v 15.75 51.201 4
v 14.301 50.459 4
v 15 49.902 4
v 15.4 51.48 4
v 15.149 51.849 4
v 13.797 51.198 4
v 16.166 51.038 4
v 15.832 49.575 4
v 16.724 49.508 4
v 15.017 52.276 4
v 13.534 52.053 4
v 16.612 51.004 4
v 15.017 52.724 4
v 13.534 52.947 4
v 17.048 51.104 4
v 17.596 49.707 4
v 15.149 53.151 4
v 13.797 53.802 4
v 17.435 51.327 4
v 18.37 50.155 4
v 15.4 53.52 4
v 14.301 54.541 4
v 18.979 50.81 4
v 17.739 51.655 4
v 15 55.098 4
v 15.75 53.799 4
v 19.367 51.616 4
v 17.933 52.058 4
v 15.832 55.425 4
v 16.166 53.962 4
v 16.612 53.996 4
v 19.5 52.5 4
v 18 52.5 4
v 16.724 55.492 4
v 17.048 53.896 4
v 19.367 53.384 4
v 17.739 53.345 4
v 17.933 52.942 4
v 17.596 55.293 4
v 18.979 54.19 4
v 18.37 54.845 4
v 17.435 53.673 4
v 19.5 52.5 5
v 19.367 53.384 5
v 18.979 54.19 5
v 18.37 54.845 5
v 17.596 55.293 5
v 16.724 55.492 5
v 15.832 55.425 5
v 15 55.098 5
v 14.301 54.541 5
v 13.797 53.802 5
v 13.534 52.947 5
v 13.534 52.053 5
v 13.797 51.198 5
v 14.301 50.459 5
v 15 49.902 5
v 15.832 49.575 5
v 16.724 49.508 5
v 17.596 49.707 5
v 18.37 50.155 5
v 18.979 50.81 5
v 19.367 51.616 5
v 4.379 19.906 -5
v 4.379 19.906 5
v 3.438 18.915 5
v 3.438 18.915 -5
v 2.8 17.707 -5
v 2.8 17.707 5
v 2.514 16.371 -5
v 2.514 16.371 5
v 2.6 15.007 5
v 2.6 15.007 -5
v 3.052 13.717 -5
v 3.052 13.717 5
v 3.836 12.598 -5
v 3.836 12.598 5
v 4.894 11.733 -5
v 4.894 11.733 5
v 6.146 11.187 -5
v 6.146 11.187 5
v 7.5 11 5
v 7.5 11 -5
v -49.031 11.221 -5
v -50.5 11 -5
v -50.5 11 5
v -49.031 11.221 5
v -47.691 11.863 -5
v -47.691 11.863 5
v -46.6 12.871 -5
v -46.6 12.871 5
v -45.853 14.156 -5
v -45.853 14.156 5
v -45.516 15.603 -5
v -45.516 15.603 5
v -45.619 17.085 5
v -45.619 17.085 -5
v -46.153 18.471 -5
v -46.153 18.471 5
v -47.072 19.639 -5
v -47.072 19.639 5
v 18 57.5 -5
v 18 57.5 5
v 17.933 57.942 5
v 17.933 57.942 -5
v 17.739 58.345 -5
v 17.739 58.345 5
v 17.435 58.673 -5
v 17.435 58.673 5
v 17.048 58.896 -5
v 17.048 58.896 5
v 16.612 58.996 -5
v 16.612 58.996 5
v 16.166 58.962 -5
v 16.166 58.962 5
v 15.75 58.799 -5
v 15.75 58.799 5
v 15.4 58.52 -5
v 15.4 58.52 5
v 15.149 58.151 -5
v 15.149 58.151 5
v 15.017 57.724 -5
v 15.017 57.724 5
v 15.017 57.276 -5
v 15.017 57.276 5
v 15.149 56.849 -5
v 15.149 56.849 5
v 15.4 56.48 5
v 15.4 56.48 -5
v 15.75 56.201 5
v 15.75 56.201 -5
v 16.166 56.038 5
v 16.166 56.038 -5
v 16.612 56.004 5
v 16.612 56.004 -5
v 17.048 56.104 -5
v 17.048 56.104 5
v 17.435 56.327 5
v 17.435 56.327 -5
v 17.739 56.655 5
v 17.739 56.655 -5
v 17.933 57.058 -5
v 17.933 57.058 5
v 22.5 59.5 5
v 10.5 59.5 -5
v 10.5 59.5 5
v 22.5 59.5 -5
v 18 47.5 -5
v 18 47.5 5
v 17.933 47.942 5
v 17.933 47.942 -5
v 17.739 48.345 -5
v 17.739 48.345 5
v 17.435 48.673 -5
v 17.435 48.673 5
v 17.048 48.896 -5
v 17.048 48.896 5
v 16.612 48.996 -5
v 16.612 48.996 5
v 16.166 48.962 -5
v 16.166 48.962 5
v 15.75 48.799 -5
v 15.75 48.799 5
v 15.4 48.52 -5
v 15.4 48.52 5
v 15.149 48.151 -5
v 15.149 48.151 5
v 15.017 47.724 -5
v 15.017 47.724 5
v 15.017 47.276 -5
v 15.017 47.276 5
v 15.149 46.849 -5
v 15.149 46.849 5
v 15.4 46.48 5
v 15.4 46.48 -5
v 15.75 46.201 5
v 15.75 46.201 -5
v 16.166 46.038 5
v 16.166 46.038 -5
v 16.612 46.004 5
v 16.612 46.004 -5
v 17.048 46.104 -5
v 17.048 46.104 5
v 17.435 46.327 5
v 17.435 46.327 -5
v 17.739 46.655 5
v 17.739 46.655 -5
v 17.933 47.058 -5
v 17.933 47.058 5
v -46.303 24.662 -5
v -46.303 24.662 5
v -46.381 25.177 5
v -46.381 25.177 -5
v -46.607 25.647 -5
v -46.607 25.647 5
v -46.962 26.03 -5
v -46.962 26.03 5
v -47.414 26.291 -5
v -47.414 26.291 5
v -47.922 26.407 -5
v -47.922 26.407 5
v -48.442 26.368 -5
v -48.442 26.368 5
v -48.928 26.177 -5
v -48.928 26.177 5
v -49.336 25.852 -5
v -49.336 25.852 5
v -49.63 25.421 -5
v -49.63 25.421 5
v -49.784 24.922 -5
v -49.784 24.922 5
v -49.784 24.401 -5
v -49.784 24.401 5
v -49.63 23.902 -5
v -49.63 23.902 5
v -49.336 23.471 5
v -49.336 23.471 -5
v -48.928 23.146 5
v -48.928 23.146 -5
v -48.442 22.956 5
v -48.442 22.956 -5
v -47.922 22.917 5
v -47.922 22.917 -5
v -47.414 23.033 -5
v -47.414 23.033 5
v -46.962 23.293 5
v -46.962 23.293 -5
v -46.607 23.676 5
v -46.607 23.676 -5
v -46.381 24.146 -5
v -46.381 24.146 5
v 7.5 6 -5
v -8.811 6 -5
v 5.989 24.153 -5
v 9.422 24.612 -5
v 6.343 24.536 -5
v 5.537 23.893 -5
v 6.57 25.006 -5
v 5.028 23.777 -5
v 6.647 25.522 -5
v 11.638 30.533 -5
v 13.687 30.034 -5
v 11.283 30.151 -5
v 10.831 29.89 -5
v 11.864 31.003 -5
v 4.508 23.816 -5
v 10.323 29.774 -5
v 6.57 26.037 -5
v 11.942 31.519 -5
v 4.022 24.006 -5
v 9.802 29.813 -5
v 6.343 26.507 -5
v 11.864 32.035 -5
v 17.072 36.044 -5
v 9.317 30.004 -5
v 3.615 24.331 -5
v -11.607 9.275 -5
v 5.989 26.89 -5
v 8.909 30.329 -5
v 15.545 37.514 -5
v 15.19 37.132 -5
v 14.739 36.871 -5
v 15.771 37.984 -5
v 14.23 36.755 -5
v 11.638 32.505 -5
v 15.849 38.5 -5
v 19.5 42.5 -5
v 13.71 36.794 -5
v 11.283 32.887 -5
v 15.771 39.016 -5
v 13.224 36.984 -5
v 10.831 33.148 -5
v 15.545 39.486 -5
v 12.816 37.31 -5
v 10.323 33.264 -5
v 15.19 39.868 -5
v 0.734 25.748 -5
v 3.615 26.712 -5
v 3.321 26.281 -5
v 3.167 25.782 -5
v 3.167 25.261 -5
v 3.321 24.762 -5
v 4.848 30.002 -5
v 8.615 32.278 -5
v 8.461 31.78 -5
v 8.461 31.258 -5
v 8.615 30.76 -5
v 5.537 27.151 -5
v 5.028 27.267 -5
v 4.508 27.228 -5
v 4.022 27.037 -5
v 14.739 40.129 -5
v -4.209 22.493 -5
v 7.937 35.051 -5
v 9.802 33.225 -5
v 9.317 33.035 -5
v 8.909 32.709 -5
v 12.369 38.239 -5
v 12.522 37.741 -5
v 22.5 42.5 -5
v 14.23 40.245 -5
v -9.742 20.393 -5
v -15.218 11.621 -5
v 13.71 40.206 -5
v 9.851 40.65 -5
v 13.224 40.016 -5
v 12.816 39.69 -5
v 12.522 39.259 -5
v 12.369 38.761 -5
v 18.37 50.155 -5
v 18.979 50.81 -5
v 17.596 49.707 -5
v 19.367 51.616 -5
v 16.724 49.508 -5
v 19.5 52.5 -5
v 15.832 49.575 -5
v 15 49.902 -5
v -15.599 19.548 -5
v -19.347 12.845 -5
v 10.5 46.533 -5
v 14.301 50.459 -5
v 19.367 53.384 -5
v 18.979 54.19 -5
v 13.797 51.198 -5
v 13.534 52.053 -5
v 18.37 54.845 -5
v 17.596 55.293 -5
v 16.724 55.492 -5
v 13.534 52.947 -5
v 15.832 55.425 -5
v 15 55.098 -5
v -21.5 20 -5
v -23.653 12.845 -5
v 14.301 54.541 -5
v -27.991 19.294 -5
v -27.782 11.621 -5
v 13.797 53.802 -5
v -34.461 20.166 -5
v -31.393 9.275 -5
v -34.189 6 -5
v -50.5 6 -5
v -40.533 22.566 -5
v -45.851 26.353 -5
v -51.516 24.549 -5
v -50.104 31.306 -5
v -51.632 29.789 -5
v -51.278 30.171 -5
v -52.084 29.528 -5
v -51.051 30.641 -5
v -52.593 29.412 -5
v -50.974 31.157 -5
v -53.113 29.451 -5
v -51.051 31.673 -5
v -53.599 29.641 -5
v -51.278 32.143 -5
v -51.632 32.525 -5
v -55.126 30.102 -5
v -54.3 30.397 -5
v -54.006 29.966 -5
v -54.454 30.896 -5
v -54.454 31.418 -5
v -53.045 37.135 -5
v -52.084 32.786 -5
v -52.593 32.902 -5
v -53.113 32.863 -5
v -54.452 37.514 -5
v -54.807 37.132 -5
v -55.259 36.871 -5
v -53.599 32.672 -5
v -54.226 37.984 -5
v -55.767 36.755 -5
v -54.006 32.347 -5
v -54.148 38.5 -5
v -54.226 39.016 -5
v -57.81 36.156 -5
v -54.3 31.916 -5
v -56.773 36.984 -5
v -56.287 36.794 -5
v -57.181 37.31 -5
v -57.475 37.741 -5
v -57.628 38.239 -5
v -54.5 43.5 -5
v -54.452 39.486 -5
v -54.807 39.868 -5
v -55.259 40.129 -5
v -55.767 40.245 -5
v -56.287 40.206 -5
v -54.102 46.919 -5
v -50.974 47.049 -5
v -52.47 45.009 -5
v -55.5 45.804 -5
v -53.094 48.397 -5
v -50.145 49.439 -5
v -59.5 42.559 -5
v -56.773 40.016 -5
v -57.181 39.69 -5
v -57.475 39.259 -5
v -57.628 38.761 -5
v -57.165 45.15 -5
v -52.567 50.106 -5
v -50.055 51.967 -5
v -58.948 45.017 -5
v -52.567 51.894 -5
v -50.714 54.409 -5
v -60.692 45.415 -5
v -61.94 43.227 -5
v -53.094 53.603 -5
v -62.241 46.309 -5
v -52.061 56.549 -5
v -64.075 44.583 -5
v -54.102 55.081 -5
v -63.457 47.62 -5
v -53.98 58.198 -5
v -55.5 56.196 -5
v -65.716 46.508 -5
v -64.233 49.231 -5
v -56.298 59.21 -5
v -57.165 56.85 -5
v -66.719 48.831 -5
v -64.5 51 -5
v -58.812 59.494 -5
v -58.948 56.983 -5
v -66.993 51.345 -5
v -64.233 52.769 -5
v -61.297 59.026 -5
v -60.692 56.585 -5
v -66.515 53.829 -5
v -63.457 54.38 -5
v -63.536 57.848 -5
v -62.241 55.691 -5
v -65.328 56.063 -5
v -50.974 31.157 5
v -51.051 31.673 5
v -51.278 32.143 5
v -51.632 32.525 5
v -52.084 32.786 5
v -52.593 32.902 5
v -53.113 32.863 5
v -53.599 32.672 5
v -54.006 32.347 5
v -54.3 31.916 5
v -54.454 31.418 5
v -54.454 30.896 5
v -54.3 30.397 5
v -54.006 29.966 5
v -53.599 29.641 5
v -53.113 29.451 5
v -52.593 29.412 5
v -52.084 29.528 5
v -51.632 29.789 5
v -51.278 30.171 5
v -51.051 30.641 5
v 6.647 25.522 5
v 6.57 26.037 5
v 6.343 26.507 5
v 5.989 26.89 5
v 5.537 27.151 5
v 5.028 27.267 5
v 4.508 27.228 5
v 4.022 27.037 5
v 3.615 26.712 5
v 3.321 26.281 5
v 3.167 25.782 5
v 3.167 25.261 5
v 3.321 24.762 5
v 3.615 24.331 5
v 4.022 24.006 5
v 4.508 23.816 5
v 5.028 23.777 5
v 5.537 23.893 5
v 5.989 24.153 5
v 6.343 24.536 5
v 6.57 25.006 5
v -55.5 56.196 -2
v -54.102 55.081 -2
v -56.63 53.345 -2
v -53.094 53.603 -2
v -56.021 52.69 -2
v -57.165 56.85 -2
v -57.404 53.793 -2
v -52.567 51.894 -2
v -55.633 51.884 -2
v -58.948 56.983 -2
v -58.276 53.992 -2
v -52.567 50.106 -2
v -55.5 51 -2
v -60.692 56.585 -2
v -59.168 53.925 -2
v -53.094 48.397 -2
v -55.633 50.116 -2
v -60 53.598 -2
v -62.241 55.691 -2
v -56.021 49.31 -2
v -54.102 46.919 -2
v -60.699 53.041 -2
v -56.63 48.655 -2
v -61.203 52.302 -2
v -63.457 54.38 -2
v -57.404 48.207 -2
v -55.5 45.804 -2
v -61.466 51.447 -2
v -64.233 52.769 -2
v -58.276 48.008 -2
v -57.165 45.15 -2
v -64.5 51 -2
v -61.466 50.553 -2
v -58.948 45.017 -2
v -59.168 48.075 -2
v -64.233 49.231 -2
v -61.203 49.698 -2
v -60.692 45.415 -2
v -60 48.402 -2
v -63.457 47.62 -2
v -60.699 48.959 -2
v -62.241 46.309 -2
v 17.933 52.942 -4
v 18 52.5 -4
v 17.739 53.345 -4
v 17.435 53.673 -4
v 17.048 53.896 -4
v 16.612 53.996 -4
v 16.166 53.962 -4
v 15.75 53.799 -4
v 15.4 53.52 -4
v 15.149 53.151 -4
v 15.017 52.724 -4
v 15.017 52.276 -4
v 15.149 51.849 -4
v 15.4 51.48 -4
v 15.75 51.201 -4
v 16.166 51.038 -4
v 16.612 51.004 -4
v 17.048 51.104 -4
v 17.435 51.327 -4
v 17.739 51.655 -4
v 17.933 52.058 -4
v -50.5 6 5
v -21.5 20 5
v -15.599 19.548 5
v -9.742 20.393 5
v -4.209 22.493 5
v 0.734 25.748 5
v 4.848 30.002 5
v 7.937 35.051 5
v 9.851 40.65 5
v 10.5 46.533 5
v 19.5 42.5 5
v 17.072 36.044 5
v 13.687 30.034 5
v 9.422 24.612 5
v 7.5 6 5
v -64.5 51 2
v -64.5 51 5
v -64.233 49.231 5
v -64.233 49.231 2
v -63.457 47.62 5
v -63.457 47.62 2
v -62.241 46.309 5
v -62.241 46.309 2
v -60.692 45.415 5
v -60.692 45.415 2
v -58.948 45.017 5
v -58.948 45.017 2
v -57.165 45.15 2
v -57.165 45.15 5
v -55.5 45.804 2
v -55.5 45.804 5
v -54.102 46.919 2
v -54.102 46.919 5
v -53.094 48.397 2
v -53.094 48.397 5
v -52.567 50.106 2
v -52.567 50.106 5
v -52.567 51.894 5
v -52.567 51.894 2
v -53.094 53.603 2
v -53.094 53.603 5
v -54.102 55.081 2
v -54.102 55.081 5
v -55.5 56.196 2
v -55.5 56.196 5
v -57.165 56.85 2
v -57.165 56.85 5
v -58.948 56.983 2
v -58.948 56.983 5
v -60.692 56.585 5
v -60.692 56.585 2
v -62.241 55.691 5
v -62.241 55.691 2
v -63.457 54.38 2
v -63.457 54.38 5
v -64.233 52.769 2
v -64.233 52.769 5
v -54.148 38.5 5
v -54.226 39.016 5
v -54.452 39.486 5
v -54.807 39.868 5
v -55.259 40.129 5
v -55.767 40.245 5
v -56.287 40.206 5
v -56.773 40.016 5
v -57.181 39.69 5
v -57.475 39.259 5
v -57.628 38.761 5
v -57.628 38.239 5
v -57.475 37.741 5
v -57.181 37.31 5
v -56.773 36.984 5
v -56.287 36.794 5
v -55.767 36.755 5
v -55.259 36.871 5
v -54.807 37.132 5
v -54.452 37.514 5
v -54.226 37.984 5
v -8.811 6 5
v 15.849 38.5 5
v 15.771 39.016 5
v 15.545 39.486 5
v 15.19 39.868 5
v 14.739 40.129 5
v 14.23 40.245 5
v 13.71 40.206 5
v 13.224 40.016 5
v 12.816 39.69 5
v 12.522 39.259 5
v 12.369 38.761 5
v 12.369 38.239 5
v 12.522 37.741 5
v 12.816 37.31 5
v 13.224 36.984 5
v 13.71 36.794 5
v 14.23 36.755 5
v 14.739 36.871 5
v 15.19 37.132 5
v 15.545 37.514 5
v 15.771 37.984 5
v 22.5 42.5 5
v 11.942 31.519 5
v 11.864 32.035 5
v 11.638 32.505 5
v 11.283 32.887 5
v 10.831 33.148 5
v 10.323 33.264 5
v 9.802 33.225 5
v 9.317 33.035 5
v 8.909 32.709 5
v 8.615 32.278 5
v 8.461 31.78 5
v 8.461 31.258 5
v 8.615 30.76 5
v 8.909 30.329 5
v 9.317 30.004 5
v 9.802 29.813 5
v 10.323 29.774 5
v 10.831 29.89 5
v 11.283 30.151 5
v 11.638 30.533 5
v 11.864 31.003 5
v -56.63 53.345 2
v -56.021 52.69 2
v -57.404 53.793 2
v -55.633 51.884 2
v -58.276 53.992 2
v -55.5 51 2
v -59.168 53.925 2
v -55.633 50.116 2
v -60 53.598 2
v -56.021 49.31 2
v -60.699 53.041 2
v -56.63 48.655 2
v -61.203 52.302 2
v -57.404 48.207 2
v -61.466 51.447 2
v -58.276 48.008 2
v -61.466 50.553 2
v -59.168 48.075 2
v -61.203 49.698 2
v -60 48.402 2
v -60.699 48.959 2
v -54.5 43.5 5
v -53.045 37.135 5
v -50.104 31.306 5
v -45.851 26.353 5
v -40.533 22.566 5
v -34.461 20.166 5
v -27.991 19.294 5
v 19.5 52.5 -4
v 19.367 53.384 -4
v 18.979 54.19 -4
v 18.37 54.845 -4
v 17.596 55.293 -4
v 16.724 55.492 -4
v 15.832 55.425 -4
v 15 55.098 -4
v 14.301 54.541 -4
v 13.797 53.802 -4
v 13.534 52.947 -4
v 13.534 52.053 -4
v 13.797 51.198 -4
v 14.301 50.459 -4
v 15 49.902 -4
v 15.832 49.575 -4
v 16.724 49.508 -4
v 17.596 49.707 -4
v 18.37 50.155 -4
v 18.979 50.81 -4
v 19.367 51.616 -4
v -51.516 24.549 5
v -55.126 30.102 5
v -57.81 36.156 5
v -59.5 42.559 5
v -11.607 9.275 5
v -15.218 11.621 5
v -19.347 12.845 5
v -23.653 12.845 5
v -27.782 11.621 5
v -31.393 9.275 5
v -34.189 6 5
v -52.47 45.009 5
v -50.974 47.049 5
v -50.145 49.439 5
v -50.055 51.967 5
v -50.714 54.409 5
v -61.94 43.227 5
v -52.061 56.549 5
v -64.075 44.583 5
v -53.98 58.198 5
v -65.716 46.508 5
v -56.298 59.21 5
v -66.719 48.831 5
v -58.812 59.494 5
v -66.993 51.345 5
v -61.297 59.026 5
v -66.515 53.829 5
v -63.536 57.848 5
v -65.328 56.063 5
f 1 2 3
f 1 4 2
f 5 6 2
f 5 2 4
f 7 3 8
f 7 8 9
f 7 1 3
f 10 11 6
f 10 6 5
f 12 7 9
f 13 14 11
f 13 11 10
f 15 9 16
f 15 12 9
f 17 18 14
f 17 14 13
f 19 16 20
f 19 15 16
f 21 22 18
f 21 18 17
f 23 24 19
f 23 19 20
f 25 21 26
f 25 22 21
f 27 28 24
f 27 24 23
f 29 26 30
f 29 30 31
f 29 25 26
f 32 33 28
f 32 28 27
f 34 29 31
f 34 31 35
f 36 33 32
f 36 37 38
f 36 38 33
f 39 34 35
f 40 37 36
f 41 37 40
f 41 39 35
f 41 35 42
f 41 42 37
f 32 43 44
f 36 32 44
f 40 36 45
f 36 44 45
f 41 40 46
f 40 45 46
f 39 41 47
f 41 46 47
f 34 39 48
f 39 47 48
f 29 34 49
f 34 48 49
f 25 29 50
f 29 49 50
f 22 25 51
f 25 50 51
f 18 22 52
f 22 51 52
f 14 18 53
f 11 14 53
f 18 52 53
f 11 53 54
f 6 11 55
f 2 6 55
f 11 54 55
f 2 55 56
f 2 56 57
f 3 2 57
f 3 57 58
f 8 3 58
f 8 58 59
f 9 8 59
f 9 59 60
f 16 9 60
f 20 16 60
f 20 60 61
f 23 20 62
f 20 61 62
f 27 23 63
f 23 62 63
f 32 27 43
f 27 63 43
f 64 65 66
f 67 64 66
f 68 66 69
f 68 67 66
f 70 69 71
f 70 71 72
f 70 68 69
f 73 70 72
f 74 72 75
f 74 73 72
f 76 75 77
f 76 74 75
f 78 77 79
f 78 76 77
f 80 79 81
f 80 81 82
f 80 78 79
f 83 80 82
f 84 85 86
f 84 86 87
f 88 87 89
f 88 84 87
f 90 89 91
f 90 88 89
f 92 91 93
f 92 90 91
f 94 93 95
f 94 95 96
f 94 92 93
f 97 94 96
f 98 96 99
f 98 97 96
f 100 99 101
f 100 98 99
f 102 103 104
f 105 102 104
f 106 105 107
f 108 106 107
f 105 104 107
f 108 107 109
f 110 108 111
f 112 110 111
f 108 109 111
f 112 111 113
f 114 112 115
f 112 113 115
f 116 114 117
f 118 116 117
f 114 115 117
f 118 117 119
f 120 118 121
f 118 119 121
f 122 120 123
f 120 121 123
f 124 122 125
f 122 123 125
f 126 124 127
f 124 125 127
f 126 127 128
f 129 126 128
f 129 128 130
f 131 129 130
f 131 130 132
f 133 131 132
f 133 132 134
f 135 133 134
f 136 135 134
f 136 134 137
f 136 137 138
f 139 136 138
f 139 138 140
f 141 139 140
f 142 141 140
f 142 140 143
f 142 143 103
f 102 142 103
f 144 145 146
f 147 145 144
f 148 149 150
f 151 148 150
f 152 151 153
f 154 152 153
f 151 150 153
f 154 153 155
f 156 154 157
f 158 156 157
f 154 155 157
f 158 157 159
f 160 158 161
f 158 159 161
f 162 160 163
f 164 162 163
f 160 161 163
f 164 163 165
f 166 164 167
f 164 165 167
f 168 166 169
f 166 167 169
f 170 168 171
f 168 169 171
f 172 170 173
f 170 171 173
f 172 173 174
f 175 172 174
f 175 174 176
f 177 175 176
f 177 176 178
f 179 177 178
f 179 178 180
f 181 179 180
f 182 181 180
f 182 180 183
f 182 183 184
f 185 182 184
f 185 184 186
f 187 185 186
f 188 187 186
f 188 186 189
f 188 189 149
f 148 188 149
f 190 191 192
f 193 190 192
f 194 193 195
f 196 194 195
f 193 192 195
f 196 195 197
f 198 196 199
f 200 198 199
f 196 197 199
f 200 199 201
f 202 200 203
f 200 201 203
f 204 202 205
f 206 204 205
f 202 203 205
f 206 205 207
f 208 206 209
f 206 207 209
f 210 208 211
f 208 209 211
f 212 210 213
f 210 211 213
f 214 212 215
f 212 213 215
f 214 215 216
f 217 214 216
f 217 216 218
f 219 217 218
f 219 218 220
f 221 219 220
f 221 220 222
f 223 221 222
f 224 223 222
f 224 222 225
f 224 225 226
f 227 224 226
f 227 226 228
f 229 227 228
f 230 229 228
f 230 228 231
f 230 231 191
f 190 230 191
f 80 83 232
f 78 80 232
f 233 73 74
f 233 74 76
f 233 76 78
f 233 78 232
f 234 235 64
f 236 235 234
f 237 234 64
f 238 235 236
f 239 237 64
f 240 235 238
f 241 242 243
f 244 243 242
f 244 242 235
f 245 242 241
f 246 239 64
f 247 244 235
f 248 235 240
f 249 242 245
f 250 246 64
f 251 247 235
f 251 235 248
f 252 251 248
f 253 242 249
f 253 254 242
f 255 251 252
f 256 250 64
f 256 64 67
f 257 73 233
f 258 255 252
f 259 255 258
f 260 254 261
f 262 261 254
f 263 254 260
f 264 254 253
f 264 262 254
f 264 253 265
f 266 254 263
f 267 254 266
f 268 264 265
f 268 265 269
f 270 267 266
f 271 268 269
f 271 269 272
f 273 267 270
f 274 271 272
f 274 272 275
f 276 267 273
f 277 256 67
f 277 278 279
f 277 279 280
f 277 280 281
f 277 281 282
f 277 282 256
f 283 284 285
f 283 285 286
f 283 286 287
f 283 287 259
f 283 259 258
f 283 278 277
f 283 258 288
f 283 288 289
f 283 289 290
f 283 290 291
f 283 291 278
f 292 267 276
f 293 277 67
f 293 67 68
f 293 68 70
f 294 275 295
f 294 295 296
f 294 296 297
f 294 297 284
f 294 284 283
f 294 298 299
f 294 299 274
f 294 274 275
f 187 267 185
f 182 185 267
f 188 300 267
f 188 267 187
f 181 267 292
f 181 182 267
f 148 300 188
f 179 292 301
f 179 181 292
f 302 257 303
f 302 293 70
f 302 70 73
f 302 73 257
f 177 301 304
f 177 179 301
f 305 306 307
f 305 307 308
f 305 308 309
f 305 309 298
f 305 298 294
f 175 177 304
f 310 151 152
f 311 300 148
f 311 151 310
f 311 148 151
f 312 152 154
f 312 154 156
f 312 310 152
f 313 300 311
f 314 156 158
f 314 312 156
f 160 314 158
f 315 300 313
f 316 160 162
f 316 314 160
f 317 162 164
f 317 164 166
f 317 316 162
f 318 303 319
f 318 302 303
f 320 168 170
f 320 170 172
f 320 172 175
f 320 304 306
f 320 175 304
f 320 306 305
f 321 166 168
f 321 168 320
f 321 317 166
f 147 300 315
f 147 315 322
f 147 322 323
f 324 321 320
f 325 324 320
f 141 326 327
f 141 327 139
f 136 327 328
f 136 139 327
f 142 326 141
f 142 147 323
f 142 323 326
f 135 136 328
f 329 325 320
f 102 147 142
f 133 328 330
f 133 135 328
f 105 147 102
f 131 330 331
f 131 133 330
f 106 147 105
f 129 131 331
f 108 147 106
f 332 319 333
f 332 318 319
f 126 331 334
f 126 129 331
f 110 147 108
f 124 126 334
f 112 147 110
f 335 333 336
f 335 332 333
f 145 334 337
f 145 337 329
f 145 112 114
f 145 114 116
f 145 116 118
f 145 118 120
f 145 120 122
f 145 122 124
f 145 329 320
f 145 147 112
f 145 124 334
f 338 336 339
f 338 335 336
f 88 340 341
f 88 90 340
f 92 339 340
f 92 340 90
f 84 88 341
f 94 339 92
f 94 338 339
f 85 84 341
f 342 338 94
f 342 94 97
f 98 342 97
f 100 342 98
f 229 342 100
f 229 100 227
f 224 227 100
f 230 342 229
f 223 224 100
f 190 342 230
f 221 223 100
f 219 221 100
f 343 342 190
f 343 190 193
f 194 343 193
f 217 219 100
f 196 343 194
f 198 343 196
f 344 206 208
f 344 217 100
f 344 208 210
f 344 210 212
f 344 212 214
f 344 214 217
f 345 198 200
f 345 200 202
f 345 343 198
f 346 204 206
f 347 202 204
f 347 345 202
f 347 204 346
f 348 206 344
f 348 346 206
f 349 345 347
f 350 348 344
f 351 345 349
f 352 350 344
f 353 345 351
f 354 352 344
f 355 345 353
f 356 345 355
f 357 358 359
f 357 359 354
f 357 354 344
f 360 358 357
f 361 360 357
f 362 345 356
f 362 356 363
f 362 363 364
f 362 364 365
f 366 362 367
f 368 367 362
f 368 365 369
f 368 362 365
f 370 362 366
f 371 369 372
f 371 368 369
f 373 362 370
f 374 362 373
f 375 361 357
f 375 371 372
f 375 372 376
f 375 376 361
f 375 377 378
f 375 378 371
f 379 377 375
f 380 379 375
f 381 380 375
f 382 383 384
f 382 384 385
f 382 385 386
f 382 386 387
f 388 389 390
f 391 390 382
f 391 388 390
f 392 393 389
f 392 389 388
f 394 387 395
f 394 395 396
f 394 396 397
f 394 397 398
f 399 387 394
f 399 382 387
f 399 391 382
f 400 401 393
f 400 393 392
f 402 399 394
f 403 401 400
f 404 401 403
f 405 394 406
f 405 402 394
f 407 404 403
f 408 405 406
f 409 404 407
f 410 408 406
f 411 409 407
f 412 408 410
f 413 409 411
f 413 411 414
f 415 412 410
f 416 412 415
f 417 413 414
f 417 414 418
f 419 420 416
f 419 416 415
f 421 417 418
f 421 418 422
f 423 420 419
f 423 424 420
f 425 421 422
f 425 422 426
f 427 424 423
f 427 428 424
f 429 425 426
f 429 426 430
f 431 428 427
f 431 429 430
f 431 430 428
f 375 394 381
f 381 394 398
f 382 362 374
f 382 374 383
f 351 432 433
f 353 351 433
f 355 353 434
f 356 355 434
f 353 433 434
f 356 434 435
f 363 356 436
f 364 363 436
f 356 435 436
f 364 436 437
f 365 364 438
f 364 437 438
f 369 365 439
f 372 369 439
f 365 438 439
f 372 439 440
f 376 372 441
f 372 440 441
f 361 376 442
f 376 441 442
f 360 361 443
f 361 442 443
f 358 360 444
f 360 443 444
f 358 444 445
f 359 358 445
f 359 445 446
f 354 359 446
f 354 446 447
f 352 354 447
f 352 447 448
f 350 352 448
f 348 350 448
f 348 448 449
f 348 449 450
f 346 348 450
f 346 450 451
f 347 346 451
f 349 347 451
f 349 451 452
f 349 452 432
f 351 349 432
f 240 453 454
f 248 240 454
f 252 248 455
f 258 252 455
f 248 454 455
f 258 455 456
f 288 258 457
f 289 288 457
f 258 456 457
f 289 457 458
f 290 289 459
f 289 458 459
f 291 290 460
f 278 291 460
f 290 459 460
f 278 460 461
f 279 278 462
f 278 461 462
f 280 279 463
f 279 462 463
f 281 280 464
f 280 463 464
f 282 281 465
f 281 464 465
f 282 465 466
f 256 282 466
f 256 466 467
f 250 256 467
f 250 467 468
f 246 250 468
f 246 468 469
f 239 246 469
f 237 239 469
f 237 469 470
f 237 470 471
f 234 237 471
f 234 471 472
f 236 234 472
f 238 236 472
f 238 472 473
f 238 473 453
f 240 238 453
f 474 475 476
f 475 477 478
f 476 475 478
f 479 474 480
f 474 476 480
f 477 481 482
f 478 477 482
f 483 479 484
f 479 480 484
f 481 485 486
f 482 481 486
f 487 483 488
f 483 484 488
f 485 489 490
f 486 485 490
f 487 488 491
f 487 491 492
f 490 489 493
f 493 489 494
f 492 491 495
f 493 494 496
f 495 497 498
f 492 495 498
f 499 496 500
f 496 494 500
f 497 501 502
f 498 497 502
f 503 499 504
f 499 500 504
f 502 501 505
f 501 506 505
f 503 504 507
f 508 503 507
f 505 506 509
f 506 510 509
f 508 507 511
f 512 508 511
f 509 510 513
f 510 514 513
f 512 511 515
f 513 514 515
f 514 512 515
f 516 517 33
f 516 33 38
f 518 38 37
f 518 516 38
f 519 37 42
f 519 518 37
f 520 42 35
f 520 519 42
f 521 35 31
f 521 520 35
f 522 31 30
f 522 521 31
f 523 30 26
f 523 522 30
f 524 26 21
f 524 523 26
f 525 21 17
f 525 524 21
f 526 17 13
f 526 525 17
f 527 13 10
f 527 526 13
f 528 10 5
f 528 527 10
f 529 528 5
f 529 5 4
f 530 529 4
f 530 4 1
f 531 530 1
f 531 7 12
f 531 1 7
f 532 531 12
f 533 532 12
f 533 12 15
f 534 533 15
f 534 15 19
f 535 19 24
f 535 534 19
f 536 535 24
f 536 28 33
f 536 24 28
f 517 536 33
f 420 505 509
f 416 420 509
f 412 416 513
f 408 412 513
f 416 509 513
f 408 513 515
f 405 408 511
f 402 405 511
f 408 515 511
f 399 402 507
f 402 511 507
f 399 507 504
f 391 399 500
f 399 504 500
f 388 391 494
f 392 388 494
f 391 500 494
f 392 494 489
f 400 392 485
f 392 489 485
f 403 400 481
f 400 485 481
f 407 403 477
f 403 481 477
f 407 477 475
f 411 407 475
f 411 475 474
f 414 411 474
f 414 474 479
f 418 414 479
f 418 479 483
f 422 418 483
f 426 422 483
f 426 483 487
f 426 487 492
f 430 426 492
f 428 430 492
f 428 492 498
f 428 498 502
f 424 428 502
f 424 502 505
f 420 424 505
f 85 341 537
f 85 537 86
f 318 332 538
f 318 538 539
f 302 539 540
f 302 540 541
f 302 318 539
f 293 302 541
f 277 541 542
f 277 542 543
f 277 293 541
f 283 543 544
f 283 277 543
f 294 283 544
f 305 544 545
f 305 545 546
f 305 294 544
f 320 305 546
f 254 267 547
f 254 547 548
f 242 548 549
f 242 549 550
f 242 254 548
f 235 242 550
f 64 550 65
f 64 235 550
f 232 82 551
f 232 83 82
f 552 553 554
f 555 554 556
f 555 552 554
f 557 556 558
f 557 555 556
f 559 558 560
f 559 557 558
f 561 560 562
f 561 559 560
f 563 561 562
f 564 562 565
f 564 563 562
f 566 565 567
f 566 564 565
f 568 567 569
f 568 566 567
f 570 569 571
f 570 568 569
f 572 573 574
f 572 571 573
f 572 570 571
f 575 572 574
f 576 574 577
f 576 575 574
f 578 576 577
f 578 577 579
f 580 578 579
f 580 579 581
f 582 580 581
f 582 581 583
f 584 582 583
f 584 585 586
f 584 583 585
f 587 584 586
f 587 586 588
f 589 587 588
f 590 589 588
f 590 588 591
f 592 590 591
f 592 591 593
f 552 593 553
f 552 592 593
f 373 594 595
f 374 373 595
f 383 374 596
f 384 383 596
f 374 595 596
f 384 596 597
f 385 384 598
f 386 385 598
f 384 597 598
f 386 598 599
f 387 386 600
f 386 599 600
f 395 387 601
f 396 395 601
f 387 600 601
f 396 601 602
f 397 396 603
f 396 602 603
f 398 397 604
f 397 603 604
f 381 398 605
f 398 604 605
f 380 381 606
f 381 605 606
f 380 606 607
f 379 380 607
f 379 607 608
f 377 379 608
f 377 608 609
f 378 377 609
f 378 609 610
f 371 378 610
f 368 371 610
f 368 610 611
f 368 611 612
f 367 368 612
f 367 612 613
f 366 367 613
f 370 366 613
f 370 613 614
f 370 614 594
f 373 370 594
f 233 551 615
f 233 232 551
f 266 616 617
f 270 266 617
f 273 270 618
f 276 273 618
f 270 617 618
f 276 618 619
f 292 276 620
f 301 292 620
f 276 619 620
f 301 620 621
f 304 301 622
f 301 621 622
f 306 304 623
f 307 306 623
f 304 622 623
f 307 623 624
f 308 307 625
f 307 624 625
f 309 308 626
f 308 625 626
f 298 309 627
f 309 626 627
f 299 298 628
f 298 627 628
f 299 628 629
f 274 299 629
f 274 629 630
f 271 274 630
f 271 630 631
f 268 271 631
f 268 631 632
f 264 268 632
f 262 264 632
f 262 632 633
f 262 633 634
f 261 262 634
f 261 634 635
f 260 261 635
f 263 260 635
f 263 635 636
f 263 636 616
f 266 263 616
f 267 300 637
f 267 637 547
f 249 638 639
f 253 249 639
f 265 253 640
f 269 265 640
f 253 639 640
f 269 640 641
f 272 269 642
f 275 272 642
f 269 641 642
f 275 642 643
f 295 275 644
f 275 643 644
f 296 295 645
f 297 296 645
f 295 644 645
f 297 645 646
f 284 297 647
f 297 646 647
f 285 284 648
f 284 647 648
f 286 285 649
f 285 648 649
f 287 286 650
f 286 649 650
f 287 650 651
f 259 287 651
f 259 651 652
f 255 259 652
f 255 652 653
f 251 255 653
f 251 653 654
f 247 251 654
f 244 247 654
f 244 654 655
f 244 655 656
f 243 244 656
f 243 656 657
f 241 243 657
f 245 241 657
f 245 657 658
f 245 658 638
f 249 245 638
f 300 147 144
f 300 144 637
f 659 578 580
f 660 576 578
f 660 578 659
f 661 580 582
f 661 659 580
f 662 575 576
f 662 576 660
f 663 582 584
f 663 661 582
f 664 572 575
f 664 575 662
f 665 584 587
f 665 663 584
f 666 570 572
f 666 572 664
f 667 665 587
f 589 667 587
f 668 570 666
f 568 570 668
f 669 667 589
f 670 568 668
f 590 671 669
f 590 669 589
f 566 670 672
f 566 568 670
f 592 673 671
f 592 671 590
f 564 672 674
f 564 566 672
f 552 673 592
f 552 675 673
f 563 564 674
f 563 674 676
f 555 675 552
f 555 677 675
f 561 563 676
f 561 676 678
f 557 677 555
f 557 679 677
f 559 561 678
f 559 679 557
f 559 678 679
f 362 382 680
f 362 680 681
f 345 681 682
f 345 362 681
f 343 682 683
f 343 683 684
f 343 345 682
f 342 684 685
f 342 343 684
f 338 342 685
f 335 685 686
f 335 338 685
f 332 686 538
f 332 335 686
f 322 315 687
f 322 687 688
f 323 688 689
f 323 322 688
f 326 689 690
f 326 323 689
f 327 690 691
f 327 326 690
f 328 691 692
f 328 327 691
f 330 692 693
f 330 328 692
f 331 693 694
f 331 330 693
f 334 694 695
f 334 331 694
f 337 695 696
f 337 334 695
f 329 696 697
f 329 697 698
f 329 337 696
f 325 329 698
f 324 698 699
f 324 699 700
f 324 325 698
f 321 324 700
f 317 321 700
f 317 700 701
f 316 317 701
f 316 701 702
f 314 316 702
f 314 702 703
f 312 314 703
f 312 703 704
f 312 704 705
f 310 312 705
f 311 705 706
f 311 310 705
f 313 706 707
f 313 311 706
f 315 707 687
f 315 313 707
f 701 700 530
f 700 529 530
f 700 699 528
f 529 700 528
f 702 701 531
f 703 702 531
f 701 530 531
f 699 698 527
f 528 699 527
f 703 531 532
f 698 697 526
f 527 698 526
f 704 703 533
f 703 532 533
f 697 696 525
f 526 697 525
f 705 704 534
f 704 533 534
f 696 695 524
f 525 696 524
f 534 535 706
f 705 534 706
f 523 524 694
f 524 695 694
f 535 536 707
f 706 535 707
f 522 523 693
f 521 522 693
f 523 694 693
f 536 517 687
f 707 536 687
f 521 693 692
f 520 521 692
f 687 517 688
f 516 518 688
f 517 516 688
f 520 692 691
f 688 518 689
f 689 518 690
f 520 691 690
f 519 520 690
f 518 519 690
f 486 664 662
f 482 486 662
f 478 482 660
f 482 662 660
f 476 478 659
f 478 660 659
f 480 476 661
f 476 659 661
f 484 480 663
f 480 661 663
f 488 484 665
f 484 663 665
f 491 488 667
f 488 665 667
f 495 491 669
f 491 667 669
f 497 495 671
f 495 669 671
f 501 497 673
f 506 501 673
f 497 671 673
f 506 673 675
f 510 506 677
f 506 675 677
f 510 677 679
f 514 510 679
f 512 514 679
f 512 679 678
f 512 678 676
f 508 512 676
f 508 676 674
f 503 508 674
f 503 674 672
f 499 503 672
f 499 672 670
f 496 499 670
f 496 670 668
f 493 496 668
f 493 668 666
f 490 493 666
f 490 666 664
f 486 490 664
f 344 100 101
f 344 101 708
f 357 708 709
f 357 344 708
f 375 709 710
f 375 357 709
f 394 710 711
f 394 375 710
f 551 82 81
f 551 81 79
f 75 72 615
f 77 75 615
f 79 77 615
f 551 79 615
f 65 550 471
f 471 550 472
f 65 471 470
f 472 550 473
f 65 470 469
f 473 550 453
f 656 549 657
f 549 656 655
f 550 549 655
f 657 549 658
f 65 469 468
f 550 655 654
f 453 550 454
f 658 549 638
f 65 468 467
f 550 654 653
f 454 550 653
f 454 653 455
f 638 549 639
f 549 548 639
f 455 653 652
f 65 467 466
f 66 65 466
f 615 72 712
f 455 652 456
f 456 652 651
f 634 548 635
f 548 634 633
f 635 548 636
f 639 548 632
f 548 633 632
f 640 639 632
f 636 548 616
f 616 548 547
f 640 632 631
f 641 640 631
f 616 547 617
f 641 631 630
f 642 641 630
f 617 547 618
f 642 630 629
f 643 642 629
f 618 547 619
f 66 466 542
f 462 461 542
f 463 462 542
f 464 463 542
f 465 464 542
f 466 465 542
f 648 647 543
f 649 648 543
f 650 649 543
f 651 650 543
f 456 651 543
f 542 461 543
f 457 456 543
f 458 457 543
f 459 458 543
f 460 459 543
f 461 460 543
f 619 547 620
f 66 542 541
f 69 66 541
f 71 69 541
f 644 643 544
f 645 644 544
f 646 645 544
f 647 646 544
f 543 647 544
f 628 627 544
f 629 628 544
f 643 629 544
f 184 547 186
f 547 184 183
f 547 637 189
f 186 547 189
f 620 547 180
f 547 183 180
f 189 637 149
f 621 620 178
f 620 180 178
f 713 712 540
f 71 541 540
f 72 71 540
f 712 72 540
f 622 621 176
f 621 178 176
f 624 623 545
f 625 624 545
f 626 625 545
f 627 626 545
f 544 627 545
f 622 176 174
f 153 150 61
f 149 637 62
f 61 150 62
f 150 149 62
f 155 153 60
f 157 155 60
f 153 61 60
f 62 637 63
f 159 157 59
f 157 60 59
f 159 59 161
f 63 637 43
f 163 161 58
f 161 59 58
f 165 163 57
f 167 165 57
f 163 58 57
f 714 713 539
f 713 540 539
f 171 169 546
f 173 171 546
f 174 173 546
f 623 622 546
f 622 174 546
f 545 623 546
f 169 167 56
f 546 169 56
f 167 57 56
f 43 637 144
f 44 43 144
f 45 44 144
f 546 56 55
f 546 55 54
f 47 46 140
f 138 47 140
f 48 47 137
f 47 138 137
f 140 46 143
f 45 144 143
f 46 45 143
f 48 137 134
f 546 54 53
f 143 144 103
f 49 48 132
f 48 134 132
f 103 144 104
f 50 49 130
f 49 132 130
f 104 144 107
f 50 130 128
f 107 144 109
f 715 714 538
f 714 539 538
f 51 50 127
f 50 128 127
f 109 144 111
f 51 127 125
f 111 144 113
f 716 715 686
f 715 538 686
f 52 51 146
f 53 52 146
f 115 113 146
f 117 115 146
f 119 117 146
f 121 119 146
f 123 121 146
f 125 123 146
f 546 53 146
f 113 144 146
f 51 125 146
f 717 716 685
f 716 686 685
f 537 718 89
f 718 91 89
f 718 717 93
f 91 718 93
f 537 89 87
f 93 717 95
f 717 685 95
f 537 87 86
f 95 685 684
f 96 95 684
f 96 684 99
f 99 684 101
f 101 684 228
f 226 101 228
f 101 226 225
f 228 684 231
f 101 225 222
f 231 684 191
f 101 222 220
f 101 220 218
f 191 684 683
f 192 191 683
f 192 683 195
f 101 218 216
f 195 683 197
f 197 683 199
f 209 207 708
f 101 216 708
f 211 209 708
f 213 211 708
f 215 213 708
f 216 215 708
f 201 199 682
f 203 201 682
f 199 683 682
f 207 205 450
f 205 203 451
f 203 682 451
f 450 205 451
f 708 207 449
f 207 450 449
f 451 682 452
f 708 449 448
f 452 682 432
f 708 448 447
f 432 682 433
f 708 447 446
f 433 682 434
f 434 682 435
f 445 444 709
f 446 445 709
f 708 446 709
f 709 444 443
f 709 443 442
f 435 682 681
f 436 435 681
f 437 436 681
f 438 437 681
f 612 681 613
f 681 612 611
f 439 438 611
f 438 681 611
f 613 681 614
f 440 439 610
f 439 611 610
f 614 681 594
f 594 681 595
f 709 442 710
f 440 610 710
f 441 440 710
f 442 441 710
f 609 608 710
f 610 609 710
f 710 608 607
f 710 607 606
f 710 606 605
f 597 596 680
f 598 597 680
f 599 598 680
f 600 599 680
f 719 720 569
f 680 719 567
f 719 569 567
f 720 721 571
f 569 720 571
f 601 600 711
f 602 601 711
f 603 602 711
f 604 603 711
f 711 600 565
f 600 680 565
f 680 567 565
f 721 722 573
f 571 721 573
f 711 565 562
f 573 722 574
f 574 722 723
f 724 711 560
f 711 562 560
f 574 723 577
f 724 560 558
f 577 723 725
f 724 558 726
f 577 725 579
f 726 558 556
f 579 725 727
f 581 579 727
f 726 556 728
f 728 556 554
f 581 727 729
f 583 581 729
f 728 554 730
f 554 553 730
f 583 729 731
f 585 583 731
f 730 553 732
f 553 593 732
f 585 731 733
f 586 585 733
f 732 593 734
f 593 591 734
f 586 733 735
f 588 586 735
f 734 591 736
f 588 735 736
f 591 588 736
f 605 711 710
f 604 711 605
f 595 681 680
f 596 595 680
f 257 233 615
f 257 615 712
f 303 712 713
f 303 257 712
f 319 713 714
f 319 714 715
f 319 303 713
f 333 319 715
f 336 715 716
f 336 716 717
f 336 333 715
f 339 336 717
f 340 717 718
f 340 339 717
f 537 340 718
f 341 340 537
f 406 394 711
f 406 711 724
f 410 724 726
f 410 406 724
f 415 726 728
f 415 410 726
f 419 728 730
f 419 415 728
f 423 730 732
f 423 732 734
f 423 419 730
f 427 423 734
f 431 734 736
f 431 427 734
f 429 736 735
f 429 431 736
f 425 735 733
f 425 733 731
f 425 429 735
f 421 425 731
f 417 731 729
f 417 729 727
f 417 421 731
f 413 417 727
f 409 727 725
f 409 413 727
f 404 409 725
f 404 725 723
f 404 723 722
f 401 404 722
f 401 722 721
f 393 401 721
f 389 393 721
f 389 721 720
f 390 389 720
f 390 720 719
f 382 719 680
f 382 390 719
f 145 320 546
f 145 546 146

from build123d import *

# Parameters (mm, degrees)
EXTRUDE_1_DEPTH          = 5
SKETCH_2_R               = 3
CUT_EXTRUDE_1_DEPTH      = 1
CUT_EXTRUDE_2_DEPTH      = 91.056926441
CUT_EXTRUDE_2_DEPTH_BACK = 91.056926441
SKETCH_3_R               = 1.5
SKETCH_4_R               = 1.5
CUT_EXTRUDE_3_DEPTH      = 91.162353563
SKETCH_5_R               = 1.75
CUT_EXTRUDE_4_DEPTH      = 91.162353563
CUT_EXTRUDE_START        = -3
SKETCH_6_R               = 6
CUT_EXTRUDE_5_DEPTH      = 94.162353563
SKETCH_7_R               = 3
CUT_EXTRUDE_6_DEPTH      = 90.879085443


with BuildPart() as part:
    # 草图1 → 凸台-拉伸1 (new, symmetric)
    with BuildSketch(Plane(origin=(0, 0, 0), x_dir=(-1, 0, 0), z_dir=(0, 0, -1))):
        with BuildLine():
            Line((-7.5, 6), (8.81142246, 6))
            ThreePointArc((8.81142246, 6), (21.5, 13), (34.18857754, 6))
            Line((34.18857754, 6), (50.5, 6))
            Line((50.5, 6), (50.5, 11))
            ThreePointArc((50.5, 11), (45.852558058, 14.155743132), (47.071569313, 19.639486643))
            ThreePointArc((47.071569313, 19.639486643), (55.125553128, 30.1016183), (59.5, 42.559028492))
            ThreePointArc((59.5, 42.559028492), (60.072054975, 59.353361189), (54.5, 43.5))
            ThreePointArc((54.5, 43.5), (43.306585473, 24.298199123), (21.5, 20))
            ThreePointArc((21.5, 20), (-0.73368794, 25.748388632), (-10.5, 46.532998323))
            Line((-10.5, 46.532998323), (-10.5, 59.5))
            Line((-10.5, 59.5), (-22.5, 59.5))
            Line((-22.5, 59.5), (-22.5, 42.5))
            Line((-22.5, 42.5), (-19.5, 42.5))
            ThreePointArc((-19.5, 42.5), (-13.686520363, 30.033883058), (-4.37890781, 19.906249293))
            ThreePointArc((-4.37890781, 19.906249293), (-2.781353665, 14.346404897), (-7.5, 11))
            Line((-7.5, 11), (-7.5, 6))
        make_face()
    extrude(amount=EXTRUDE_1_DEPTH, both=True)

    # 草图2 → 切除-拉伸1 (cut)
    with BuildSketch(Plane.XY.offset(5)):
        with Locations((16.5, 52.5)):
            Circle(SKETCH_2_R)
    cut_extrude_1 = extrude(amount=-CUT_EXTRUDE_1_DEPTH, mode=Mode.SUBTRACT)

    # 草图3 → 切除-拉伸2 (cut, two sides: drawn at the far end of the back side and taken through both)
    with BuildSketch(Plane.XY.offset(4).offset(-CUT_EXTRUDE_2_DEPTH_BACK)):
        with Locations((16.5, 52.5)):
            Circle(SKETCH_3_R)
    extrude(amount=CUT_EXTRUDE_2_DEPTH + CUT_EXTRUDE_2_DEPTH_BACK, mode=Mode.SUBTRACT)

    # 草图4 → 切除-拉伸3 (cut, through all)
    with BuildSketch(Plane.XY.offset(5)):
        with Locations((16.5, 57.5)):
            Circle(SKETCH_4_R)
        with Locations((16.5, 47.5)):
            Circle(SKETCH_4_R)
    extrude(amount=-CUT_EXTRUDE_3_DEPTH, mode=Mode.SUBTRACT)

    # 草图5 → 切除-拉伸4 (cut, through all)
    with BuildSketch(Plane.XY.offset(5)):
        with Locations((14.099159256, 38.5)):
            Circle(SKETCH_5_R)
        with Locations((10.191784732, 31.519138712)):
            Circle(SKETCH_5_R)
        with Locations((4.897441914, 25.521644724)):
            Circle(SKETCH_5_R)
        with Locations((-55.897925178, 38.5)):
            Circle(SKETCH_5_R)
        with Locations((-52.723592313, 31.156730234)):
            Circle(SKETCH_5_R)
        with Locations((-48.053046301, 24.661655181)):
            Circle(SKETCH_5_R)
    extrude(amount=-CUT_EXTRUDE_4_DEPTH, mode=Mode.SUBTRACT)

    # 镜向1: 切除-拉伸1 across plane
    add(cut_extrude_1.mirror(Plane(origin=(0, 0, 0), x_dir=(1, 0, 0), z_dir=(0, 0, -1))), mode=Mode.SUBTRACT)

    # 草图6 → 切除-拉伸5 (cut)
    with BuildSketch(Plane.XY.offset(5).offset(CUT_EXTRUDE_START)):
        with Locations((-58.5, 51)):
            Circle(SKETCH_6_R)
    cut_extrude_5 = extrude(amount=CUT_EXTRUDE_5_DEPTH, mode=Mode.SUBTRACT)

    # 镜向2: 切除-拉伸5 across plane
    add(cut_extrude_5.mirror(Plane.XY), mode=Mode.SUBTRACT)

    # 草图7 → 切除-拉伸6 (cut, through all)
    with BuildSketch(Plane.XY.offset(2)):
        with Locations((-58.5, 51)):
            Circle(SKETCH_7_R)
    extrude(amount=-CUT_EXTRUDE_6_DEPTH, mode=Mode.SUBTRACT)


solid = part.part
